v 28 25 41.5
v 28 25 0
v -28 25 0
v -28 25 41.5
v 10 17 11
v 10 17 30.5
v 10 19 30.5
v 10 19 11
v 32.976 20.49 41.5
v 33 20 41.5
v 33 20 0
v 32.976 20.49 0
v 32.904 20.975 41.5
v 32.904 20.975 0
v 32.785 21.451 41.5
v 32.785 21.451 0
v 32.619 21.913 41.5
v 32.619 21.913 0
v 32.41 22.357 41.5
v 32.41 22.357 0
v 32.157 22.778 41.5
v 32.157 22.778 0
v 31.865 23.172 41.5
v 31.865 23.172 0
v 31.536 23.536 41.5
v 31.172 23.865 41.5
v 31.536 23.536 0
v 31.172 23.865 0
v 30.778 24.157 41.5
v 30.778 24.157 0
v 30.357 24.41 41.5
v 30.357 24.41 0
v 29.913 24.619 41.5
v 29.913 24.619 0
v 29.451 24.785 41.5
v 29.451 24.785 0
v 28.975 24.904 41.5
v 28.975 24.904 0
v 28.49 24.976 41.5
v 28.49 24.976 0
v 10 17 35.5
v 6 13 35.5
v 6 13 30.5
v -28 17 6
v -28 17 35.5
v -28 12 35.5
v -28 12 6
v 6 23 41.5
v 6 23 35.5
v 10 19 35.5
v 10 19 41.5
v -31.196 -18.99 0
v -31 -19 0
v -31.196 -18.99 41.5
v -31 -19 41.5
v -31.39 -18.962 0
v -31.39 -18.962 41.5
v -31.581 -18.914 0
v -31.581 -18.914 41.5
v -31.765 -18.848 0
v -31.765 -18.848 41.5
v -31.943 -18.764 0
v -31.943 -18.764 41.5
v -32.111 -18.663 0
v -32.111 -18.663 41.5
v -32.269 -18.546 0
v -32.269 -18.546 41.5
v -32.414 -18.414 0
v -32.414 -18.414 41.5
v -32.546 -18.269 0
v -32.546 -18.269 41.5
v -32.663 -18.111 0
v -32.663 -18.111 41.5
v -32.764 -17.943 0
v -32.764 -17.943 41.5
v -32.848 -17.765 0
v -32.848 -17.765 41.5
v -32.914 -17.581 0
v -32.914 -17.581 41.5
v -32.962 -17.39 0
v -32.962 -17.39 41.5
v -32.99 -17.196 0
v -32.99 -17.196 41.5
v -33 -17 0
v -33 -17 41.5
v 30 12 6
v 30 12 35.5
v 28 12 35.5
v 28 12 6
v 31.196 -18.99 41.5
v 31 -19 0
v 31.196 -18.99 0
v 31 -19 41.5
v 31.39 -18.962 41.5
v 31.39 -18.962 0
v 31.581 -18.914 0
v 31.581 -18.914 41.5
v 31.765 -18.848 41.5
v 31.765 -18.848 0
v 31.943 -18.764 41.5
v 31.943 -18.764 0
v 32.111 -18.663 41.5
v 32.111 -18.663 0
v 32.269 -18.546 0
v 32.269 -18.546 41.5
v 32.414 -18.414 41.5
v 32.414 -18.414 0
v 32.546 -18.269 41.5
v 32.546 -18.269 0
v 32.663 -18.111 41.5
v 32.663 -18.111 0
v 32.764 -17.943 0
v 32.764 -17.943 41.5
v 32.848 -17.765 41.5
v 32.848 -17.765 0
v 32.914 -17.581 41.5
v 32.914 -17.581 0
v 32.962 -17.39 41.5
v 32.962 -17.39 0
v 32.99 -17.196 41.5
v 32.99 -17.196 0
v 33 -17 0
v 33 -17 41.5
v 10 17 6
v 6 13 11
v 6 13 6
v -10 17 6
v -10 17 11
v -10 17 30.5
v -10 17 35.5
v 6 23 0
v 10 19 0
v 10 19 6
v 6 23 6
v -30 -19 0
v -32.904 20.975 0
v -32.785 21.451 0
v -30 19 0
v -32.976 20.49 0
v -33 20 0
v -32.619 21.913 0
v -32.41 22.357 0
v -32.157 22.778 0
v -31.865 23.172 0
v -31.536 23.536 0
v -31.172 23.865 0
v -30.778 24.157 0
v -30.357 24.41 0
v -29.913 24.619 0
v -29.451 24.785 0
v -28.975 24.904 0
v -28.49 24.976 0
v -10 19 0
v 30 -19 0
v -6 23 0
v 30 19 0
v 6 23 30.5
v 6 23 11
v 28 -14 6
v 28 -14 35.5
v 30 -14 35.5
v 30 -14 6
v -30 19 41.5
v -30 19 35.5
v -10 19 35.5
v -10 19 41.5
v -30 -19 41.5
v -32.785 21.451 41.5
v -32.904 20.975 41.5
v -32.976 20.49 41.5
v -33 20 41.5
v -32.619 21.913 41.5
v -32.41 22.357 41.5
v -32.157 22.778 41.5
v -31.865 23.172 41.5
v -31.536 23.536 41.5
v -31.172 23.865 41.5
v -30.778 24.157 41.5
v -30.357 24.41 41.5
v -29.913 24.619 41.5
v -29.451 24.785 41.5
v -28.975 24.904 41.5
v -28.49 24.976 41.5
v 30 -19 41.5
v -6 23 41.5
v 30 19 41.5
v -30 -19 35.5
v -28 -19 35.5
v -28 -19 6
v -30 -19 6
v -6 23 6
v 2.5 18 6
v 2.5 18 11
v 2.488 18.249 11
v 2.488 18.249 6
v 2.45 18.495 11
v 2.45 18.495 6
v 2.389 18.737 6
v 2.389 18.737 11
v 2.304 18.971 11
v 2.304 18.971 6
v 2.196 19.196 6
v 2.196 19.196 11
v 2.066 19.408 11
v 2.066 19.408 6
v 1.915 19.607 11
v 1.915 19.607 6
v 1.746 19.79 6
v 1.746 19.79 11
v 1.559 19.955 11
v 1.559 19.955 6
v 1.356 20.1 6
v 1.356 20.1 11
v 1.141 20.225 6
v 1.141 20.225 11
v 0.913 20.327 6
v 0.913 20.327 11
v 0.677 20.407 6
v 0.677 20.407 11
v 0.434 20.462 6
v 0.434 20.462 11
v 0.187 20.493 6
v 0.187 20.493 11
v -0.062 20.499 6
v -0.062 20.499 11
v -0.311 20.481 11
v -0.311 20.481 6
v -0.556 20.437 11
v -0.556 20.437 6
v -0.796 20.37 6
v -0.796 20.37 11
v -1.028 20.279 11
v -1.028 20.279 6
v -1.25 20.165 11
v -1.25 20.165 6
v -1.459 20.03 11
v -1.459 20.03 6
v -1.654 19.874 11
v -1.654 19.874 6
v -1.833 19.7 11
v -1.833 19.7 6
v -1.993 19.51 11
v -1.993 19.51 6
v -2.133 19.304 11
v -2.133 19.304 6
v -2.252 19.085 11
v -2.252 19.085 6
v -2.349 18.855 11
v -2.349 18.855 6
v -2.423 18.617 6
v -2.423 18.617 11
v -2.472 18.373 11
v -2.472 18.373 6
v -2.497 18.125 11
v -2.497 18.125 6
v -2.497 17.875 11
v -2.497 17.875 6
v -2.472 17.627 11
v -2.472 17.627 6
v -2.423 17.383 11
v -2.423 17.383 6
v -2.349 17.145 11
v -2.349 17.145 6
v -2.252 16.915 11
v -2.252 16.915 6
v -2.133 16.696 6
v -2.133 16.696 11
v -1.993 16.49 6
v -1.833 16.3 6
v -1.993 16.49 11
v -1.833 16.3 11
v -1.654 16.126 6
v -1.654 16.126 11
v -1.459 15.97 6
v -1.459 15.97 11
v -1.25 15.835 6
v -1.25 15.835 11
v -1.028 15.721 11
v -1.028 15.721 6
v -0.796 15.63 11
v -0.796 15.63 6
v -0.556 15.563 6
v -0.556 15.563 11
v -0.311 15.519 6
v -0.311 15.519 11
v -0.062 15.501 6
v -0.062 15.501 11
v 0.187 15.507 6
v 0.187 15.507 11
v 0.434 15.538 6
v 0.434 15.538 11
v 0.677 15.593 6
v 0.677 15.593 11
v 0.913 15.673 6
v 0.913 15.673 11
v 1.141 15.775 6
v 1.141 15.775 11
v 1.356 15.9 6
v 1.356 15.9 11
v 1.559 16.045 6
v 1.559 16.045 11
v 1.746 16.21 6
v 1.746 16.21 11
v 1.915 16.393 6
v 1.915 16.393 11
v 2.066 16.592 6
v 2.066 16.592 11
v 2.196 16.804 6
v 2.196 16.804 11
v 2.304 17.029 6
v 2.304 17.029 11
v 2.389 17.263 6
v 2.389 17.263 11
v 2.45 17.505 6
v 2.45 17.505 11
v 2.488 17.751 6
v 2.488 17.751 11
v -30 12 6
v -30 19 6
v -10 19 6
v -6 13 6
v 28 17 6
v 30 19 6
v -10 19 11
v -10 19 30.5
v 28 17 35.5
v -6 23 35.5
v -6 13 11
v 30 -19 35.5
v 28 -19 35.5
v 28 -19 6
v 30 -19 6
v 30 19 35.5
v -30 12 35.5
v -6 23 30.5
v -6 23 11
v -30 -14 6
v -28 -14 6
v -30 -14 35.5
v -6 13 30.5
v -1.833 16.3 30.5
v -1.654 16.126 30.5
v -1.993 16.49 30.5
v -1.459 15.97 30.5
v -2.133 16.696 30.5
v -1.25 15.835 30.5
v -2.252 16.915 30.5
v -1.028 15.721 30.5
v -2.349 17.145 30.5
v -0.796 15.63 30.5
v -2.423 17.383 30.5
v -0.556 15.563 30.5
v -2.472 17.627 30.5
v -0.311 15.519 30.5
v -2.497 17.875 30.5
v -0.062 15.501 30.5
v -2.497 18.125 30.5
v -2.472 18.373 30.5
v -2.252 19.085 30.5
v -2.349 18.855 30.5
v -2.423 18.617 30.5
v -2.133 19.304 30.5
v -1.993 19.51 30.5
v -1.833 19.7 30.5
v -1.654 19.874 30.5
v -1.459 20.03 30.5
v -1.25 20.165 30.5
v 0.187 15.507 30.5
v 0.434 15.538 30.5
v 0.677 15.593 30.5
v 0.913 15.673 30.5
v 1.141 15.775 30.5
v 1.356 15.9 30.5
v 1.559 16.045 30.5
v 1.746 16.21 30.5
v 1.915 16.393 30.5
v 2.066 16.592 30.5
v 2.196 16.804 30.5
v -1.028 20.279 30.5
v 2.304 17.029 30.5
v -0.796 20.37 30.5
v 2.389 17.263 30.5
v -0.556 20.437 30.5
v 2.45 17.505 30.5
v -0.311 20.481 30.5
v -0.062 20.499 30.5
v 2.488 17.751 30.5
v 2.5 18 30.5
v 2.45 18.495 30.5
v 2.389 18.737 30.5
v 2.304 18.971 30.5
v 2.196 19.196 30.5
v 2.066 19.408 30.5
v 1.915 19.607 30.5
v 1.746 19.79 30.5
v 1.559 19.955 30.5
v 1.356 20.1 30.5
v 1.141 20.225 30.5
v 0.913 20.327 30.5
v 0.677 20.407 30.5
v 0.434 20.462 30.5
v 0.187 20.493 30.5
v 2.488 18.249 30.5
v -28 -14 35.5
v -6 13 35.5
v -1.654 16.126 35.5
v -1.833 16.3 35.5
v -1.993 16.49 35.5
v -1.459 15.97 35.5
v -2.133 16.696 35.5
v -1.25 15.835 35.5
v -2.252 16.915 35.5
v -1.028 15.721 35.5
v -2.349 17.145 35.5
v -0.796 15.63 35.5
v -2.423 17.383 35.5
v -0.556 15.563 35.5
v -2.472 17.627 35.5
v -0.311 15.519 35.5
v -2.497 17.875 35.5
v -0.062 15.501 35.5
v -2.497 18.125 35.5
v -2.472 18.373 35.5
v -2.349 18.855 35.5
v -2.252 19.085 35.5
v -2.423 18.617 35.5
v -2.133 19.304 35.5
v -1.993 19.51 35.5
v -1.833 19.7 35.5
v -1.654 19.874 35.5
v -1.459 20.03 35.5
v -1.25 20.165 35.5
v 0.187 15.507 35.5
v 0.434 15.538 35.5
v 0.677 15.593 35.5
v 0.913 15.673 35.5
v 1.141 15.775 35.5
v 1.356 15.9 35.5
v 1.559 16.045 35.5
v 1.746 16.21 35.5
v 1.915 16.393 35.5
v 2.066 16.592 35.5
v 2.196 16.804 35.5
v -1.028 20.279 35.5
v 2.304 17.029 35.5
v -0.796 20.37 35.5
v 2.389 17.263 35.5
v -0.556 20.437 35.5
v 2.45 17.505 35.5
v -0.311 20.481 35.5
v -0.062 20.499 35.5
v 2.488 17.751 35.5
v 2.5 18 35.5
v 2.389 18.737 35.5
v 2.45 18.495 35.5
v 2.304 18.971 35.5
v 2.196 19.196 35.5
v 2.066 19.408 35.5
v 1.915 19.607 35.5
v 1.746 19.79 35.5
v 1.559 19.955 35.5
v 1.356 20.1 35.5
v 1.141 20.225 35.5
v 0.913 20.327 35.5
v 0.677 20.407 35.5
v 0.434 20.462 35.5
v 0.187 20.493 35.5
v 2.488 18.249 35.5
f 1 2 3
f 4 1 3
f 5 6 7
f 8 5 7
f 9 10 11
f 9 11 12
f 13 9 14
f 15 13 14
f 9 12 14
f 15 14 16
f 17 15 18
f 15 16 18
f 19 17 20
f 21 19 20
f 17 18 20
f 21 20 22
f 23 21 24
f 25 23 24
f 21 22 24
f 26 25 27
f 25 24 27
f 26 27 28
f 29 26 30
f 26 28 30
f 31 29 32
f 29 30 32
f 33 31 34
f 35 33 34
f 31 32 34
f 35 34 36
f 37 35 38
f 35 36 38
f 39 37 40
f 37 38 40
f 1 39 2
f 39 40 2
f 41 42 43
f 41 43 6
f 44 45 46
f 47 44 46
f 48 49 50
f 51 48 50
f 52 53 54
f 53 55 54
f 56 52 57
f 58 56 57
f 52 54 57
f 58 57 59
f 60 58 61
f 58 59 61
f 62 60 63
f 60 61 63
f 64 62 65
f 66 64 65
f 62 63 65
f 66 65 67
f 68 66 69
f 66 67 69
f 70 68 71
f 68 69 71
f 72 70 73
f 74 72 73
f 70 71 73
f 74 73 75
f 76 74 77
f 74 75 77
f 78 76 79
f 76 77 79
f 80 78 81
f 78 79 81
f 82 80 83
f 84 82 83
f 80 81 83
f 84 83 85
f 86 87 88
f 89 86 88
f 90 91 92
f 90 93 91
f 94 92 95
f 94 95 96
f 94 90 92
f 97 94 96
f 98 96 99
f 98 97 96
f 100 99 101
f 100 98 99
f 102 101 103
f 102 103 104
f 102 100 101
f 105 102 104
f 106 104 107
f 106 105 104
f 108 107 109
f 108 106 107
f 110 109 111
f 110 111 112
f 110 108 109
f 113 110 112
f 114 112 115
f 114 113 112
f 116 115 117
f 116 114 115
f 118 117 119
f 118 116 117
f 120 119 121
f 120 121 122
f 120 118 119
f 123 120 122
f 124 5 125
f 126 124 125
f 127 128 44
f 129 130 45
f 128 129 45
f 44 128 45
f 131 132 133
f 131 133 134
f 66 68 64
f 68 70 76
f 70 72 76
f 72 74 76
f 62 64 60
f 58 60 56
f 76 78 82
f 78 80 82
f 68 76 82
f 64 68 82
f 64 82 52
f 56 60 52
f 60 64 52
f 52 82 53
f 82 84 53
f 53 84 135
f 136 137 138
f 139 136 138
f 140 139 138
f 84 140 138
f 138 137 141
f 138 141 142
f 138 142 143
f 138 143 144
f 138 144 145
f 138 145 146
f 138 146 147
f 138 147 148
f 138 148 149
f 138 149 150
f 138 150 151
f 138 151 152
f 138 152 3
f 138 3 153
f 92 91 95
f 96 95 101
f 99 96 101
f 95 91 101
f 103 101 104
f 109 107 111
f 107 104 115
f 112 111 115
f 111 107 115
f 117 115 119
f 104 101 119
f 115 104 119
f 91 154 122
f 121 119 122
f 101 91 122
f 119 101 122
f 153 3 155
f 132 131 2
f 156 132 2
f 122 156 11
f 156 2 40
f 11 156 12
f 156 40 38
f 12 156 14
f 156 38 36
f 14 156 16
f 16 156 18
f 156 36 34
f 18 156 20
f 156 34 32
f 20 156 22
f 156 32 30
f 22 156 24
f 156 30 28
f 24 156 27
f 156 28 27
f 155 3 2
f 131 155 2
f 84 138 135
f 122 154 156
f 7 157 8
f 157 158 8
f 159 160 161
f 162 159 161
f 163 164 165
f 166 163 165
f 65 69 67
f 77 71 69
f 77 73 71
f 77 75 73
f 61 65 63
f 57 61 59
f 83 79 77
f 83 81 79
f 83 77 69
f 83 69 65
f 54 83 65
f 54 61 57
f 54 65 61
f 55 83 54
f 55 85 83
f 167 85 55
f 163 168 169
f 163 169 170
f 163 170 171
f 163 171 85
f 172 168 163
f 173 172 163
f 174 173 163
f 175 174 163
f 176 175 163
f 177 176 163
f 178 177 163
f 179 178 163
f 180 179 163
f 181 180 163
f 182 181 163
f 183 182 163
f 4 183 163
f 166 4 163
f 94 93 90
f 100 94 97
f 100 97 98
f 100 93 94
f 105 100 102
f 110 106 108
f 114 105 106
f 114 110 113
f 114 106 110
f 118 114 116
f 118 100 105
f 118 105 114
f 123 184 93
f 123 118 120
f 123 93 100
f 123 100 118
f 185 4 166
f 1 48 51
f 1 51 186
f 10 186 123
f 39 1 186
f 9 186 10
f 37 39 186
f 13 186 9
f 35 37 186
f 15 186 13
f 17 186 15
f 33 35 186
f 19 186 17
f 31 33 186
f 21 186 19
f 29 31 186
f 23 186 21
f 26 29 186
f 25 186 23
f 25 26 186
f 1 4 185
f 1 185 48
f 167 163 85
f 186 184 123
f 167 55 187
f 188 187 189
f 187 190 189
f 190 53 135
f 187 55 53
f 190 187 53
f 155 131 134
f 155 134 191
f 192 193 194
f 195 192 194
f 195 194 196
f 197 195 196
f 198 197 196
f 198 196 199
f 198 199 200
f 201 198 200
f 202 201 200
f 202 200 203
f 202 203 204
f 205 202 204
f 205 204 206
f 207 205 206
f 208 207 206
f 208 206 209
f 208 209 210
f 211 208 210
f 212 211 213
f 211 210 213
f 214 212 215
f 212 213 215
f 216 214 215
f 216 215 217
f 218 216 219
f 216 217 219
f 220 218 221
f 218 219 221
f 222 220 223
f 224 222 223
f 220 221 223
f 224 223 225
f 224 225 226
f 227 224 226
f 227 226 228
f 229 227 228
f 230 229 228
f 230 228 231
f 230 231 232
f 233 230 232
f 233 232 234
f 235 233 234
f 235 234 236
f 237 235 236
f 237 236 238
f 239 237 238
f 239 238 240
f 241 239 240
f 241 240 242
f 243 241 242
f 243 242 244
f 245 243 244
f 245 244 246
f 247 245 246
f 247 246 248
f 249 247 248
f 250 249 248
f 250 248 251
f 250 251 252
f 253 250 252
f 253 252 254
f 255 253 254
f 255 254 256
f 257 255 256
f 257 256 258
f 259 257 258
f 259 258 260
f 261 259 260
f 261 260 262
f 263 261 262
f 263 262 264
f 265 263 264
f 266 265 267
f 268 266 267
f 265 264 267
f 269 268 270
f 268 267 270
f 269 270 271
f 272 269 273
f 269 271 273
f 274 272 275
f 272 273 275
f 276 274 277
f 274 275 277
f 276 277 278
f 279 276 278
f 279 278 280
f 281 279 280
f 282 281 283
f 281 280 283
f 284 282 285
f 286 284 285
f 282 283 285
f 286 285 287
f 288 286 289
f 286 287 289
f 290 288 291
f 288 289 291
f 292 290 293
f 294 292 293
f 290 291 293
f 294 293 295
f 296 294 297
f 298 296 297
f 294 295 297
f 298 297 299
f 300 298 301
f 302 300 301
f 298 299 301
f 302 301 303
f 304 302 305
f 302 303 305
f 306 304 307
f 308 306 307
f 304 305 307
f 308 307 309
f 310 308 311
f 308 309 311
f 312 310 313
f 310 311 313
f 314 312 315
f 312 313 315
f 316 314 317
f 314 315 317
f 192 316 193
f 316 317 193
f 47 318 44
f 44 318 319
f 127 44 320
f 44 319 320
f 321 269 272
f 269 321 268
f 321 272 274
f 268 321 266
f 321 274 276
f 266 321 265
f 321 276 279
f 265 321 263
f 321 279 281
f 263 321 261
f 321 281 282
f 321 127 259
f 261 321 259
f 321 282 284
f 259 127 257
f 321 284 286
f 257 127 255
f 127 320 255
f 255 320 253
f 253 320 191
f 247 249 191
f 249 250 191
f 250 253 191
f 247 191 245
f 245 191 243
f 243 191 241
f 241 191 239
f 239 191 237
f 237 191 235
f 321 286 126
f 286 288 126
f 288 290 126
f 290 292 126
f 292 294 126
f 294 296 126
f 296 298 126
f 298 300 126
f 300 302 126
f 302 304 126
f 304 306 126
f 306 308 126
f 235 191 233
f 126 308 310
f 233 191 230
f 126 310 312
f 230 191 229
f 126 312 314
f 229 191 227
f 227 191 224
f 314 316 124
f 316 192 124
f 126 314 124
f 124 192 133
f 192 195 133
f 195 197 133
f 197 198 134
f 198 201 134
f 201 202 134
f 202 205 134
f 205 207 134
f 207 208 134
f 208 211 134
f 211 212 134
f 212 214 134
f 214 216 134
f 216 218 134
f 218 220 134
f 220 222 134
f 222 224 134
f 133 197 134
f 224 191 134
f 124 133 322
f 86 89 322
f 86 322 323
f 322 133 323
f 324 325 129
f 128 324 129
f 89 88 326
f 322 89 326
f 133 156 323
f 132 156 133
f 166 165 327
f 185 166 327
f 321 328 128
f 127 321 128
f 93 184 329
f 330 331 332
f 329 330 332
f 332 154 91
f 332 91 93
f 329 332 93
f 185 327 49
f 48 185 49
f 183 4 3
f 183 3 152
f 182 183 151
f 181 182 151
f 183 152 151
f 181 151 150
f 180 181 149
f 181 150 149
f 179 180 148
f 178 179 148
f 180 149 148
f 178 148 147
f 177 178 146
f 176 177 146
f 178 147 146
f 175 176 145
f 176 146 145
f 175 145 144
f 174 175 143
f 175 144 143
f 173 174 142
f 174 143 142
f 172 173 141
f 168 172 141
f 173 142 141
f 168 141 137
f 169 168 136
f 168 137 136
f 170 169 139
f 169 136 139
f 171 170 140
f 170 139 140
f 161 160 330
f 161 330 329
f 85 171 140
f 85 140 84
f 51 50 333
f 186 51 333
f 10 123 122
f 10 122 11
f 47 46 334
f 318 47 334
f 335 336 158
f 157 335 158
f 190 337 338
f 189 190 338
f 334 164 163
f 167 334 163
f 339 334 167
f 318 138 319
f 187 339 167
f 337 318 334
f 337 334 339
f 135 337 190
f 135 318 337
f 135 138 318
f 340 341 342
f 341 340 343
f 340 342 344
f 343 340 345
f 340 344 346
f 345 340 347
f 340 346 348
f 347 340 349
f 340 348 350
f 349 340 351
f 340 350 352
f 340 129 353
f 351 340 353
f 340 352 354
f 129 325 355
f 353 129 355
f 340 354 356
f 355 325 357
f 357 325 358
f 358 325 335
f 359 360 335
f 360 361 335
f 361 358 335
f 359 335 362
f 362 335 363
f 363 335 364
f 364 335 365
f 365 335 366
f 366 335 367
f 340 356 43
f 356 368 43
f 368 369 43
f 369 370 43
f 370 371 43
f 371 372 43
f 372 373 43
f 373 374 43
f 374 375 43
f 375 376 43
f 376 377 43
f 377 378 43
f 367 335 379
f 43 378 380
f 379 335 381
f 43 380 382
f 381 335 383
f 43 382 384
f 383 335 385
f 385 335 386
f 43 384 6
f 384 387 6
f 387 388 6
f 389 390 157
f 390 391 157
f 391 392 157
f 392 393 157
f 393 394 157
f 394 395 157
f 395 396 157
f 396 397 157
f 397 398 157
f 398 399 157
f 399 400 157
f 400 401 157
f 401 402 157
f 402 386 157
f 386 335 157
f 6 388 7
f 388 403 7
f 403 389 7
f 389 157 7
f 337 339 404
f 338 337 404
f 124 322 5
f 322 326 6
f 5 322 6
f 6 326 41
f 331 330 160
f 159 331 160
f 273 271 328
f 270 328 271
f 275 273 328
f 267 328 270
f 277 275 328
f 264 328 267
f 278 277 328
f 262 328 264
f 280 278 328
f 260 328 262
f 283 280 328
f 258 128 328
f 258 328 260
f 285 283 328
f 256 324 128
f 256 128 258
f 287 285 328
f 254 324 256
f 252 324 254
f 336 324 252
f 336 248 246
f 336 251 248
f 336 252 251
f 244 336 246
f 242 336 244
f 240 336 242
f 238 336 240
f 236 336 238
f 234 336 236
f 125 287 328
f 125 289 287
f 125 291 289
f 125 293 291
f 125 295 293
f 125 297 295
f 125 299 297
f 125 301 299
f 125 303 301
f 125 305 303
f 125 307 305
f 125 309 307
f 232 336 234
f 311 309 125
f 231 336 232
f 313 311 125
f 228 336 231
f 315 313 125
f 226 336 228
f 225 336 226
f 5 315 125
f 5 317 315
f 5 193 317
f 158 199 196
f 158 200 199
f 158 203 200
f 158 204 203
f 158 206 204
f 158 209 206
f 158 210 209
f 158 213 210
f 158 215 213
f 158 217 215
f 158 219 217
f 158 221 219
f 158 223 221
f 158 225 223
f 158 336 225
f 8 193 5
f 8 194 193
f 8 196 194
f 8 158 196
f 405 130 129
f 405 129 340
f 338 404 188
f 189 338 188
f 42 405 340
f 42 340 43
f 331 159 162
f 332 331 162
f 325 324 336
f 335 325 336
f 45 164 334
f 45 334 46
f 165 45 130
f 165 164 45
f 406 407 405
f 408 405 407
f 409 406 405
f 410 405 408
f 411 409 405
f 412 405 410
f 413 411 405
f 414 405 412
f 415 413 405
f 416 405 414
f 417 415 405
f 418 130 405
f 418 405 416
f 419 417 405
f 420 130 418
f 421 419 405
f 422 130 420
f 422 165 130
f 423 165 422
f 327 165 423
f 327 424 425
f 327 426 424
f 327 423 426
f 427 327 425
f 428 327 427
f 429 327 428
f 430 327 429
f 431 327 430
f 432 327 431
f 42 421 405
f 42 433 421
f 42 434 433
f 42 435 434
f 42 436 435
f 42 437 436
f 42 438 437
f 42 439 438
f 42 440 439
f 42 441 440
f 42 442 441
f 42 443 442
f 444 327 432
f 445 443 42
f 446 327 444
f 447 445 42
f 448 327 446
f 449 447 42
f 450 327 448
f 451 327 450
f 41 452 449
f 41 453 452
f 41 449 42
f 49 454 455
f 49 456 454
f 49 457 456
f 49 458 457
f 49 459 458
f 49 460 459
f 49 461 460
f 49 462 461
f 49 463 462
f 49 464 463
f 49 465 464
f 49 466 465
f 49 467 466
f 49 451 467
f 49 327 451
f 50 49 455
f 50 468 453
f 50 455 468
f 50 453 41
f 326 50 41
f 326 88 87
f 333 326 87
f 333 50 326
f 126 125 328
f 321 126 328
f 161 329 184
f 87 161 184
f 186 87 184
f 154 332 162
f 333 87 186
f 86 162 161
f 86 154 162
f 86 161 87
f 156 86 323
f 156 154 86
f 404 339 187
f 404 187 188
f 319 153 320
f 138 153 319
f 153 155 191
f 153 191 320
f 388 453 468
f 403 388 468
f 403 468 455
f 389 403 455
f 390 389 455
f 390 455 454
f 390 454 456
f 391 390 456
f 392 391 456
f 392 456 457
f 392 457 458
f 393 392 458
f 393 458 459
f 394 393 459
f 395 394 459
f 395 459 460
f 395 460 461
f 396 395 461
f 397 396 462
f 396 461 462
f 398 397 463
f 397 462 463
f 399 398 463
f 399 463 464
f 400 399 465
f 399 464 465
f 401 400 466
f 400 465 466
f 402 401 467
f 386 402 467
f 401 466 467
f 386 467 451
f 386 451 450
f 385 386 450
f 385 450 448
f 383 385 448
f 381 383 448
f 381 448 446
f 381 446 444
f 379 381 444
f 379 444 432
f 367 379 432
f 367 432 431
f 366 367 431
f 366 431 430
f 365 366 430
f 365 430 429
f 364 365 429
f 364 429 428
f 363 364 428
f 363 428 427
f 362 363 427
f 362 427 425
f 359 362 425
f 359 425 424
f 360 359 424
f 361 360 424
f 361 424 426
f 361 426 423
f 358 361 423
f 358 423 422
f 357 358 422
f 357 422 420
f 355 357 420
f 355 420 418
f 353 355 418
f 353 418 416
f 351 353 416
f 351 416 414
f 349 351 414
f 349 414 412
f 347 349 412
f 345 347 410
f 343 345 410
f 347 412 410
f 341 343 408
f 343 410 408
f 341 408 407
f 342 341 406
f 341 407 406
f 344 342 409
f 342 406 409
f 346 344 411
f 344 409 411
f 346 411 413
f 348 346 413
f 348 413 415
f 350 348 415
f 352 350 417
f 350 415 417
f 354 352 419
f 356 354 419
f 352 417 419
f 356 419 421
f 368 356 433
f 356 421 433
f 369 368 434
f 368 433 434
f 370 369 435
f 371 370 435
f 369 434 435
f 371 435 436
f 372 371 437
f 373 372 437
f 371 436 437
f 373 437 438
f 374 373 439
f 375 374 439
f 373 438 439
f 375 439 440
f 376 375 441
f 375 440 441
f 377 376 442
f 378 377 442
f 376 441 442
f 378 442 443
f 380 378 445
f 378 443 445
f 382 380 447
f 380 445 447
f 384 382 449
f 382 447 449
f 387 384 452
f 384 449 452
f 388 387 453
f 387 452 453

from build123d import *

# Parameters (mm, degrees)
F1_DEPTH  = 41.5
F2_DEPTH  = 35.5
F3_DEPTH  = 6
F5_DEPTH  = 50
F6_R      = 2.5
F7_DEPTH  = 5
F8_DEPTH  = 19.5
F9_DEPTH  = 5
F10_DEPTH = 50
F11_R     = 2


with BuildPart() as f1:
    # F0 (on Top) → F1 (new body)
    with BuildSketch(Plane.XY):
        with BuildLine():
            Line((30, 19), (30, -19))
            Line((30, -19), (33, -19))
            Line((33, -19), (33, 19))
            Line((33, 19), (33, 20))
            ThreePointArc((33, 20), (31.5355339059, 23.5355339059), (28, 25))
            Line((28, 25), (-28, 25))
            ThreePointArc((-28, 25), (-31.5355339059, 23.5355339059), (-33, 20))
            Line((-33, 20), (-33, 19))
            Line((-33, 19), (-33, -19))
            Line((-33, -19), (-30, -19))
            Line((-30, -19), (-30, 19))
            Line((-30, 19), (-10, 19))
            Line((-10, 19), (-6, 23))
            Line((-6, 23), (6, 23))
            Line((6, 23), (10, 19))
            Line((10, 19), (30, 19))
        make_face()
    extrude(amount=F1_DEPTH)

    # F0 (on Top) → F2 (join)
    with BuildSketch(Plane.XY):
        Polygon((-30, -19), (30, -19), (30, 19), (10, 19), (-10, 19), (-30, 19), align=None)
        Polygon((-10, 19), (10, 19), (6, 23), (-6, 23), align=None)
    extrude(amount=F2_DEPTH)

    # F0 (on Top) → F3 (cut)
    with BuildSketch(Plane.XY):
        Polygon((-30, -19), (30, -19), (30, 19), (10, 19), (-10, 19), (-30, 19), align=None)
        Polygon((-10, 19), (10, 19), (6, 23), (-6, 23), align=None)
    extrude(amount=F3_DEPTH, mode=Mode.SUBTRACT)

    # F4 (on face) → F5 (cut)
    with BuildSketch(Plane.XY.offset(35.5)):
        Polygon((6, 13), (-6, 13), (-10, 17), (-28, 17), (-28, 12), (-30, 12), (-30, -14), (-28, -14), (-28, -19), (28, -19), (28, -14), (30, -14), (30, 12), (28, 12), (28, 17), (10, 17), align=None)
    extrude(amount=-F5_DEPTH, mode=Mode.SUBTRACT)

    # F6 (on face) → F7 (cut)
    with BuildSketch(Plane.XY.offset(35.5)):
        Polygon((-6, 23), (-10, 19), (-10, 17), (-6, 13), (6, 13), (10, 17), (10, 19), (6, 23), align=None)
        with Locations((0, 18)):
            Circle(F6_R, mode=Mode.SUBTRACT)
    extrude(amount=-F7_DEPTH, mode=Mode.SUBTRACT)

    # F8 (cut): a face of the model
    f8_faces = [f1.faces().sort_by_distance(p)[0] for p in [
        (-7.841886117, 20.841886117, 30.5),
    ]]
    extrude(f8_faces, amount=-F8_DEPTH, mode=Mode.SUBTRACT)

    # F6 (on face) → F9 (join)
    with BuildSketch(Plane.XY.offset(35.5)):
        Polygon((-6, 23), (-10, 19), (-10, 17), (-6, 13), (6, 13), (10, 17), (10, 19), (6, 23), align=None)
        with Locations((0, 18)):
            Circle(F6_R, mode=Mode.SUBTRACT)
    extrude(amount=-F9_DEPTH)

    # F6 (on face) → F10 (cut)
    with BuildSketch(Plane.XY.offset(35.5)):
        with Locations((0, 18)):
            Circle(F6_R)
    extrude(amount=-F10_DEPTH, mode=Mode.SUBTRACT)

    # F11
    f11_edges = [f1.edges().sort_by_distance(p)[0] for p in [
        (-33, -19, 20.75),
        (33, -19, 20.75),
    ]]
    fillet(f11_edges, radius=F11_R)


solid = f1.part
